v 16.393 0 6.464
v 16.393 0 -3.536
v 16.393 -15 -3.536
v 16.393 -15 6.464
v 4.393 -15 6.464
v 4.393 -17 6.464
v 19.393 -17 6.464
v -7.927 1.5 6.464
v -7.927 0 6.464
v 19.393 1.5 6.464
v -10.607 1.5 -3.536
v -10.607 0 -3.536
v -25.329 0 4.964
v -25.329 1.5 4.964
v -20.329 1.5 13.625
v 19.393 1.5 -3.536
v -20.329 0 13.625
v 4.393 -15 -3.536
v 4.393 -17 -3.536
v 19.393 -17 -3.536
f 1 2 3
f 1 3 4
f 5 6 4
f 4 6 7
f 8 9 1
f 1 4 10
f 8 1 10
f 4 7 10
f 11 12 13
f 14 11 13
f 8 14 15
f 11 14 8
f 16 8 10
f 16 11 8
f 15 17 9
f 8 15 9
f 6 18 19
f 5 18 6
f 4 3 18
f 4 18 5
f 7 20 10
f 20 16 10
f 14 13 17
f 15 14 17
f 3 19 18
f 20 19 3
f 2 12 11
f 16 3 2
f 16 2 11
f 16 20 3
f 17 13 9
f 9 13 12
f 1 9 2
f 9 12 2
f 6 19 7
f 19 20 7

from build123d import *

# Parameters (mm, degrees)
BOSS_EXTRUDE1_DEPTH = 1.5
SKETCH2_W           = 3
SKETCH2_H           = 10
BOSS_EXTRUDE2_DEPTH = 17
SKETCH3_W           = 10
SKETCH3_H           = 2
BOSS_EXTRUDE3_DEPTH = 12


with BuildPart() as part:
    # Sketch1 → Boss-Extrude1 (new body)
    with BuildSketch(Plane(origin=(0, 0, 0), x_dir=(1, 0, 0), z_dir=(0, 1, 0))):
        Polygon((-10.606601718, 3.535533906), (-25.329033582, -4.964466094), (-20.329033582, -13.624720132), (-7.927109793, -6.464466094), (19.393398282, -6.464466094), (19.393398282, 3.535533906), align=None)
    extrude(amount=BOSS_EXTRUDE1_DEPTH)

    # Sketch2 → Boss-Extrude2 (add)
    with BuildSketch(Plane.XZ):
        with Locations((17.893398282, 1.464466094)):
            Rectangle(SKETCH2_W, SKETCH2_H)
    extrude(amount=BOSS_EXTRUDE2_DEPTH)

    # Sketch3 → Boss-Extrude3 (add)
    with BuildSketch(Plane.ZY.offset(-16.393398282)):
        with Locations((1.464466094, -16)):
            Rectangle(SKETCH3_W, SKETCH3_H)
    extrude(amount=BOSS_EXTRUDE3_DEPTH)


solid = part.part
